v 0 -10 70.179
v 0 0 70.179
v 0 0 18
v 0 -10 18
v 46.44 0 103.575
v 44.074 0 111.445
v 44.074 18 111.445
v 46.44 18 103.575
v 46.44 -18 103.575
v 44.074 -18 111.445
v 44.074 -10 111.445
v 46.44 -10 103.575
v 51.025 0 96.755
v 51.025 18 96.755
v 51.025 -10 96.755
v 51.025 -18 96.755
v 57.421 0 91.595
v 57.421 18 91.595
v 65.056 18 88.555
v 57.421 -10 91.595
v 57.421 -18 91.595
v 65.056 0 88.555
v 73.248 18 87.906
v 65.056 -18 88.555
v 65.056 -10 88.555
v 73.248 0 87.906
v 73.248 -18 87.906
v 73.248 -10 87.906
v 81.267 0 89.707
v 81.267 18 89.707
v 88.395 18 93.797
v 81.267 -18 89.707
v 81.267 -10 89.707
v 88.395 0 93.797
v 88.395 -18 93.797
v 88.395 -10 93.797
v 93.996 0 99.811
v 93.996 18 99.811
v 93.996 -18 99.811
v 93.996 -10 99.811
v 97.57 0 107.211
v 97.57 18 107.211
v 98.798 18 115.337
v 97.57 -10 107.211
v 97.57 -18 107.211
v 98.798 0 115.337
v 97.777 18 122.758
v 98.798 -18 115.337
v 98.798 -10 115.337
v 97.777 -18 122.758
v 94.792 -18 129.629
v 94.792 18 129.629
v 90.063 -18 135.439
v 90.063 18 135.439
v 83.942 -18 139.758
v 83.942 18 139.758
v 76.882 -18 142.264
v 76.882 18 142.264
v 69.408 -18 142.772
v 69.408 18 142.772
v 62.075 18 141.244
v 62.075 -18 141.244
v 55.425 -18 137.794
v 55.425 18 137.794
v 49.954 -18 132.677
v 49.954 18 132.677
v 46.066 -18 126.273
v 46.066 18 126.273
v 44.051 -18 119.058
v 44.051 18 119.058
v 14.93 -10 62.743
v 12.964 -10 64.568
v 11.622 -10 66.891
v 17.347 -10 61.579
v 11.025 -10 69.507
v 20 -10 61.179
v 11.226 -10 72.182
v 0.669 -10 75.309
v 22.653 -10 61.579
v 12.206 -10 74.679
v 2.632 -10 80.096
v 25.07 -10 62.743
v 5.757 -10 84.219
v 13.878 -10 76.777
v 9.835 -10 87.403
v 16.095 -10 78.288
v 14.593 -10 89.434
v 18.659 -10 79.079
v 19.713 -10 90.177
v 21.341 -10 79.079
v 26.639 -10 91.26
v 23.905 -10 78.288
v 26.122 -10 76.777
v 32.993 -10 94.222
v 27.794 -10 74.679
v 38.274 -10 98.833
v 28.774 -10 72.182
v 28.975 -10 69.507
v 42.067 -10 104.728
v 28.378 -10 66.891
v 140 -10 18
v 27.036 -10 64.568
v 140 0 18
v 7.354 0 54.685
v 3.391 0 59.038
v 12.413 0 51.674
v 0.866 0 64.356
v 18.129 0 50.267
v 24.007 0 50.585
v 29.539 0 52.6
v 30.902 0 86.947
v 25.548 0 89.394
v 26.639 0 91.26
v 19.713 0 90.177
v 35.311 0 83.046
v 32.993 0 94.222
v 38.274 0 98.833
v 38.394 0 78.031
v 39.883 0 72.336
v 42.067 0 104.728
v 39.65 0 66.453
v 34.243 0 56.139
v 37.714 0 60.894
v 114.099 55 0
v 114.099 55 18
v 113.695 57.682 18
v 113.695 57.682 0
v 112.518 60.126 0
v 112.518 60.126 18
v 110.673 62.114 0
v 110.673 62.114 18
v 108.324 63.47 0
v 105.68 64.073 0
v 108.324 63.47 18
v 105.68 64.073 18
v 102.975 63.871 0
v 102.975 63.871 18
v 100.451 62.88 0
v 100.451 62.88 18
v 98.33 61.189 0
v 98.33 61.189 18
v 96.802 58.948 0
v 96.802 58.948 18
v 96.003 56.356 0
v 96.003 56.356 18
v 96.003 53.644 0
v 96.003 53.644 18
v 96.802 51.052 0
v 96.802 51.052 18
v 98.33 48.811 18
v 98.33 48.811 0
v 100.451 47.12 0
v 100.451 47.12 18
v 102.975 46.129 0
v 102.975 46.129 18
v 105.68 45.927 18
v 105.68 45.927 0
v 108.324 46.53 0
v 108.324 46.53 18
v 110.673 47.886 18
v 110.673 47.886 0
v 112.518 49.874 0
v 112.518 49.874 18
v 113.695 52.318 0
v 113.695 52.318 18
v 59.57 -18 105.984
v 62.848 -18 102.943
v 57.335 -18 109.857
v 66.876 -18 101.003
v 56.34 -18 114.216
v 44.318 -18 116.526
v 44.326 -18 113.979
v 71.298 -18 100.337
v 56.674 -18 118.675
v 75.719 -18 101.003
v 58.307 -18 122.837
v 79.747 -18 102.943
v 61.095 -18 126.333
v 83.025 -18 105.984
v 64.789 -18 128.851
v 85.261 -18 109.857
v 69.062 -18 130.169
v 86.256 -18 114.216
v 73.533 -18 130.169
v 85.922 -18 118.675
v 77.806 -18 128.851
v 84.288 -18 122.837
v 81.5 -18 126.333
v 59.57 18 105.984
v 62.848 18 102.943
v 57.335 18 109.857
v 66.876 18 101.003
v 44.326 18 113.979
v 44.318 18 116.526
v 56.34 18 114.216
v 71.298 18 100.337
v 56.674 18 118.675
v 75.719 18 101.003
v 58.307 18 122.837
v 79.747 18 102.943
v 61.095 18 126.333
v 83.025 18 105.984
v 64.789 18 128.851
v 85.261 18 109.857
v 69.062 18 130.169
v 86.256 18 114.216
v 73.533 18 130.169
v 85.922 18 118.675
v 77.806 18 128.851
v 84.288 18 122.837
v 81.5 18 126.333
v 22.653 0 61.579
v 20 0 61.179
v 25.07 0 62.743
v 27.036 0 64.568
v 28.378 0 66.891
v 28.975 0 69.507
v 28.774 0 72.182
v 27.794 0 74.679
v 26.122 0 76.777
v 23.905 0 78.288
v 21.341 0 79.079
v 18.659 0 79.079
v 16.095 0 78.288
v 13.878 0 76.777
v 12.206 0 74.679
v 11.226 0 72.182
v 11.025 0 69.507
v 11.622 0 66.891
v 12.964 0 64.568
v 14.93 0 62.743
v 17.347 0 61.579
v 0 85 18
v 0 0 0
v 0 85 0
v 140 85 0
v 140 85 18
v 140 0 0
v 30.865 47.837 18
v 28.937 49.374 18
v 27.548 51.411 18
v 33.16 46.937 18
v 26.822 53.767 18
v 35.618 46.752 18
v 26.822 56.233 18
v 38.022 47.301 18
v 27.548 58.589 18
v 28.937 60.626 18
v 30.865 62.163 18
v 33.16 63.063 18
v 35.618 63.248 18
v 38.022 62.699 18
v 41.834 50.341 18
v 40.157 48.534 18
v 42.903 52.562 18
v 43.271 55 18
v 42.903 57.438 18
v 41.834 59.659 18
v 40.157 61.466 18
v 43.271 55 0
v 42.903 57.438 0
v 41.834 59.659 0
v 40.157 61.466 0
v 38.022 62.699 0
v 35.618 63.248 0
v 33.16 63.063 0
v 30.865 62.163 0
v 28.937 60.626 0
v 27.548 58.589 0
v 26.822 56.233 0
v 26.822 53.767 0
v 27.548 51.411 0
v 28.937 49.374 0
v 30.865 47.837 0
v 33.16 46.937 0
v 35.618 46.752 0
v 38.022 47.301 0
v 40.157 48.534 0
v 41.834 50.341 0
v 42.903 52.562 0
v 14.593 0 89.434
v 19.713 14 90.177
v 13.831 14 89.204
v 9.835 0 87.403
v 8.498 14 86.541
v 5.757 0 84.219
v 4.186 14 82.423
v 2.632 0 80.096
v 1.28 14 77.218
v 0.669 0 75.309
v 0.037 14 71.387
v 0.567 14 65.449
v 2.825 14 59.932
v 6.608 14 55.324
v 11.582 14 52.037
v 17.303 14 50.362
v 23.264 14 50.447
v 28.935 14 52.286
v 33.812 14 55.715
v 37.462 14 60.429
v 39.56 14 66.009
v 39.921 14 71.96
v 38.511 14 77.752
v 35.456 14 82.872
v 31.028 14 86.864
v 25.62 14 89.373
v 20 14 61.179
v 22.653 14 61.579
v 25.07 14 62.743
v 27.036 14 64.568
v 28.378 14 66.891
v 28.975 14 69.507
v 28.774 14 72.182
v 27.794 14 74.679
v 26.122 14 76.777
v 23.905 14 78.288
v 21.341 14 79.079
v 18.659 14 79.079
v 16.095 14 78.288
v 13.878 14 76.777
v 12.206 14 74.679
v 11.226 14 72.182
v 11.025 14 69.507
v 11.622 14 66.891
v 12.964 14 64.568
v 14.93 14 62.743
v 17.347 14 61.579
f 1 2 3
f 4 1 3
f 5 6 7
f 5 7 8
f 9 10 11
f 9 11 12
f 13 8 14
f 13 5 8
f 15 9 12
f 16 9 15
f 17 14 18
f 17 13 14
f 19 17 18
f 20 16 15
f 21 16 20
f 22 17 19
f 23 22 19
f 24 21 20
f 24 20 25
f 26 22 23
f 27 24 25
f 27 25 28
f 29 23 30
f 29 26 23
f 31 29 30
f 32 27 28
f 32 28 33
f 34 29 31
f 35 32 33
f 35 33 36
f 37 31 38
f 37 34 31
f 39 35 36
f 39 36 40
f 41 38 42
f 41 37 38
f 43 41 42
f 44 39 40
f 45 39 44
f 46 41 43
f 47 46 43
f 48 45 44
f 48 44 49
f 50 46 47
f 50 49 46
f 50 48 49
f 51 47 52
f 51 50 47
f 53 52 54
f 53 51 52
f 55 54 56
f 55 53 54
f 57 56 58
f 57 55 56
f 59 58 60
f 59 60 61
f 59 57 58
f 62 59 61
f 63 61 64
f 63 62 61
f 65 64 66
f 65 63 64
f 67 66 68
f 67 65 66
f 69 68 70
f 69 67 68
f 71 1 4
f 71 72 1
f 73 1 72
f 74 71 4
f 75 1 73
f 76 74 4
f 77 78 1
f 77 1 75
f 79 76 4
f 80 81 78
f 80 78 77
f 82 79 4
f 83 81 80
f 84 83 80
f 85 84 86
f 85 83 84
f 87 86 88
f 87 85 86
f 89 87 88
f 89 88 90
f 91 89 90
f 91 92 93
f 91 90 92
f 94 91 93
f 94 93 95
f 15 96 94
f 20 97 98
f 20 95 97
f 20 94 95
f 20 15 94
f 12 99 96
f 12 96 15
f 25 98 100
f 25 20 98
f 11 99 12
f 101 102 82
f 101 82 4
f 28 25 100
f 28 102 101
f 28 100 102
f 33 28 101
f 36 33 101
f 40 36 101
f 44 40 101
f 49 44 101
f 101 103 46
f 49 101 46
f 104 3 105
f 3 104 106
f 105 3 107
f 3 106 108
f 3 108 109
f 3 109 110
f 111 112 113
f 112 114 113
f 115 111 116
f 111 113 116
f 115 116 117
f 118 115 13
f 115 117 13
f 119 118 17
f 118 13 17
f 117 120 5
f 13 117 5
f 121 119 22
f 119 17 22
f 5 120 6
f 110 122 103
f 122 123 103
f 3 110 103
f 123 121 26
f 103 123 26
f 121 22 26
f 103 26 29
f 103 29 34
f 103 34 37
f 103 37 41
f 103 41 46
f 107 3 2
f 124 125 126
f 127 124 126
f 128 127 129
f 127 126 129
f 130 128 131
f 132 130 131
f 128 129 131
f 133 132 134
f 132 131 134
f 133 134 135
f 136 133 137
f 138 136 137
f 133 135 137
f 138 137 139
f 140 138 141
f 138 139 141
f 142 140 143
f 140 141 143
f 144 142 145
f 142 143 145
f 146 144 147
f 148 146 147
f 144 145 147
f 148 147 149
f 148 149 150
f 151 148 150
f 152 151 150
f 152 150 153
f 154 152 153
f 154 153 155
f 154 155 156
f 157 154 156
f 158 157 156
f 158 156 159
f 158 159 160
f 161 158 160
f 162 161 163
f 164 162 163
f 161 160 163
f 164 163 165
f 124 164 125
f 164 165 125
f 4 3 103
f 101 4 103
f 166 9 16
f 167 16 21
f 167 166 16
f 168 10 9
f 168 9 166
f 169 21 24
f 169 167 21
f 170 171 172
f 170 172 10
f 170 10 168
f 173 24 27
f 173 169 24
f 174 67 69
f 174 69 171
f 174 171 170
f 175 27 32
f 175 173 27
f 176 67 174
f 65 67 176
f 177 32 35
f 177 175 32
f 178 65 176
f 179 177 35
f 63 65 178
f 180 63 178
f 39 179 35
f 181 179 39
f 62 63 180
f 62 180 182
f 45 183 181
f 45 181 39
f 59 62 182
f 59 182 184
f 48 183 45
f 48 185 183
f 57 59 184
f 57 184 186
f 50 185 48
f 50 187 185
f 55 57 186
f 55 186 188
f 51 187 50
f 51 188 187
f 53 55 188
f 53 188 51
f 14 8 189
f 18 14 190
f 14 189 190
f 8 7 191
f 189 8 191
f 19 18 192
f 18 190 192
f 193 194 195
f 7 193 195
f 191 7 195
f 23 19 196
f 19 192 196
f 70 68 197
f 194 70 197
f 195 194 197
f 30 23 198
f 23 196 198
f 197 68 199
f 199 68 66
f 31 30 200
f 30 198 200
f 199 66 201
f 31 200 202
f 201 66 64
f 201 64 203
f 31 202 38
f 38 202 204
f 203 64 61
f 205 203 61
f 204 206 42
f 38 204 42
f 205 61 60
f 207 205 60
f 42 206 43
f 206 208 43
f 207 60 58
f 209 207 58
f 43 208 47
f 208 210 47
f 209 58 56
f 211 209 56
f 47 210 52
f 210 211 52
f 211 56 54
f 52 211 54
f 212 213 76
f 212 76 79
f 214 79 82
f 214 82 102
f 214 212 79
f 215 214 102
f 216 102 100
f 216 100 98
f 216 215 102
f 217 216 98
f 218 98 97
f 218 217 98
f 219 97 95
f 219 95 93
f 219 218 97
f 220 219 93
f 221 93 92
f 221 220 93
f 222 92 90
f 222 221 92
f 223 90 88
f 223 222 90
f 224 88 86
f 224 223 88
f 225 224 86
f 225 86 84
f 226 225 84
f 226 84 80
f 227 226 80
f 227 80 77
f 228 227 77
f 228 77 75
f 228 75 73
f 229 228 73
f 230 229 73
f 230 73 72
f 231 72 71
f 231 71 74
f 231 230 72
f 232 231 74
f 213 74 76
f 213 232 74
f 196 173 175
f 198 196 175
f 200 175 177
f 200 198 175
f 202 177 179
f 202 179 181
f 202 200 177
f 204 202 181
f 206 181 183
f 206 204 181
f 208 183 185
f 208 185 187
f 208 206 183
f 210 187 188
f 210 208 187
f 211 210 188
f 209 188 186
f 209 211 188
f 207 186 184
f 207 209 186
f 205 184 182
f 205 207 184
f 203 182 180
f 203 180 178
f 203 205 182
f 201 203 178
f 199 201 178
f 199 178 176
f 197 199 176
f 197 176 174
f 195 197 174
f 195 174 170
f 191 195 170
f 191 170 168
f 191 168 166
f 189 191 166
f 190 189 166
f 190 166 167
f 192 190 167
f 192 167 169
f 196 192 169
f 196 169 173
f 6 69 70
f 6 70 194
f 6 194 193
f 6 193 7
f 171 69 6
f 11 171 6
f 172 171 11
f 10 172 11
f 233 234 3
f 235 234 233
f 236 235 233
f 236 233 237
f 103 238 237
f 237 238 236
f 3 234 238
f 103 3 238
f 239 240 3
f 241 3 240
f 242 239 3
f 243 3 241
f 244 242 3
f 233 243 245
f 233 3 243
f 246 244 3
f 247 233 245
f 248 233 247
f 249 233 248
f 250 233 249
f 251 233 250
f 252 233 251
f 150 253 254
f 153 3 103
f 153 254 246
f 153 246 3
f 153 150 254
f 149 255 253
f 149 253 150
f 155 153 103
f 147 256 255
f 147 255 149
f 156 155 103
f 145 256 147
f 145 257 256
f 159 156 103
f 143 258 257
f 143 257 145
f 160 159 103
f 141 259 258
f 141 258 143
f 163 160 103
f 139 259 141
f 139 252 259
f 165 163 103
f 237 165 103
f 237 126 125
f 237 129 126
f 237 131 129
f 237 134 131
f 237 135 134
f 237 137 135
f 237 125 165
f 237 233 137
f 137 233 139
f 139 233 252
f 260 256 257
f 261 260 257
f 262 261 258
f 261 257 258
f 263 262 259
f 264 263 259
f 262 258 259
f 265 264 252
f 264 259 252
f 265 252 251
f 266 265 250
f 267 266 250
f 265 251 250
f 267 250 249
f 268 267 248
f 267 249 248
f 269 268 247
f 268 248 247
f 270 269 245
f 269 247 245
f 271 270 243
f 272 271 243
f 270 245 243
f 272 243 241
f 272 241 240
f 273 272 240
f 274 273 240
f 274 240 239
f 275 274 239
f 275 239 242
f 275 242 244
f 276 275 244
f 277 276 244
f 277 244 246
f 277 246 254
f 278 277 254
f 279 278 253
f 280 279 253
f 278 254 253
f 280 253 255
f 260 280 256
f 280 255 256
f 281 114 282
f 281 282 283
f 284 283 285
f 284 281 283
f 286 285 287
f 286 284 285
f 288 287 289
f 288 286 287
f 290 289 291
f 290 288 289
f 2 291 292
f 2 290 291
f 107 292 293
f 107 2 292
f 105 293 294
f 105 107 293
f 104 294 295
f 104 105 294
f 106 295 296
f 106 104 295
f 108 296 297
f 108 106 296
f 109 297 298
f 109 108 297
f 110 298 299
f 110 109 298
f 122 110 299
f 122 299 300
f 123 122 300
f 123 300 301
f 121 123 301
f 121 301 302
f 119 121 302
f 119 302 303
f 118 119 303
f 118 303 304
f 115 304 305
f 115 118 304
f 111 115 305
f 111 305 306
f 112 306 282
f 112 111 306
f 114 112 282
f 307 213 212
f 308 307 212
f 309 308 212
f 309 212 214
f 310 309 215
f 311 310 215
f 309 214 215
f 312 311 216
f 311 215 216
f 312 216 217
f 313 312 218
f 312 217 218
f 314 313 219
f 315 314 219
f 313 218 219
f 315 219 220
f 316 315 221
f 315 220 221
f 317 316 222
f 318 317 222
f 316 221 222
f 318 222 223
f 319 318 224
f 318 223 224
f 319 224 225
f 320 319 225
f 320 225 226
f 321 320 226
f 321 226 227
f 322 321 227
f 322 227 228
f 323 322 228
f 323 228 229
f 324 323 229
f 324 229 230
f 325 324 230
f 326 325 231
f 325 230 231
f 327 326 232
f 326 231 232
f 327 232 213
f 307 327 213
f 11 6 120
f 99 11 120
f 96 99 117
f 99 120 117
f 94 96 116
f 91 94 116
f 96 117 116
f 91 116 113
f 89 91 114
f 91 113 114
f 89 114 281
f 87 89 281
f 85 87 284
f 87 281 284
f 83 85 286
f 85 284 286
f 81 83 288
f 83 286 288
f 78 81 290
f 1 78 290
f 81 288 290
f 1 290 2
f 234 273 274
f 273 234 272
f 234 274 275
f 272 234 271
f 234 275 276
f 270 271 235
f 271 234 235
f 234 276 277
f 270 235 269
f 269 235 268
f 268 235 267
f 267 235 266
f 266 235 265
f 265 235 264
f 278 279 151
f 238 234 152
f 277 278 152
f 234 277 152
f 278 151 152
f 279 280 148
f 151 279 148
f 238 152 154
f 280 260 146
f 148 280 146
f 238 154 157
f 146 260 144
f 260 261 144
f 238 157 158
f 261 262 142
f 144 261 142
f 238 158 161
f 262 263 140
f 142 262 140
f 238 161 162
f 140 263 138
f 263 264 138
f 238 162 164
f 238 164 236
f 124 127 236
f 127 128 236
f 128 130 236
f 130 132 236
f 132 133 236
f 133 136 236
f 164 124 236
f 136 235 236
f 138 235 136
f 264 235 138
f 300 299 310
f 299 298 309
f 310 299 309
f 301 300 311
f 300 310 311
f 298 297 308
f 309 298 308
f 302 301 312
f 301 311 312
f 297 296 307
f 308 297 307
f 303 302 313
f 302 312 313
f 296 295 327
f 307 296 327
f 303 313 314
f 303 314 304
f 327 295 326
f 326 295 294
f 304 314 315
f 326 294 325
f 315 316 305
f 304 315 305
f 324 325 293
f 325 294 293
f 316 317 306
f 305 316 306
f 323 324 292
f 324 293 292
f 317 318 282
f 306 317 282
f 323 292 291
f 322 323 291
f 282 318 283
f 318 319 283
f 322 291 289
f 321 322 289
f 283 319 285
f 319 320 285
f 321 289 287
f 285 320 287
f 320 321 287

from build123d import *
from build123d.topology import SkipClean

# Parameters (mm, degrees)
SKETCH1_W           = 140
SKETCH1_H           = 85
BOSS_EXTRUDE1_DEPTH = 18
SKETCH6_R           = 15
SKETCH6_R_2         = 9
BOSS_EXTRUDE6_DEPTH = 10
SKETCH6_4_R         = 15
BOSS_EXTRUDE7_DEPTH = 18
SKETCH6_5_R         = 9
BOSS_EXTRUDE8_DEPTH = 14
SKETCH13_R          = 8.270703546
SKETCH13_R_2        = 9.098859586
CUT_EXTRUDE1_DEPTH  = 18


with BuildPart() as part:
    # Sketch1 → Boss-Extrude1 (new body)
    with BuildSketch(Plane.XY):
        with Locations((70, 42.5)):
            Rectangle(SKETCH1_W, SKETCH1_H)
    extrude(amount=BOSS_EXTRUDE1_DEPTH)

    # Sketch13 → Cut-Extrude1 (cut)
    with BuildSketch(Plane.XY.offset(18)):
        with Locations((35, 55)):
            Circle(SKETCH13_R)
        with Locations((105, 55)):
            Circle(SKETCH13_R_2)
    extrude(amount=-CUT_EXTRUDE1_DEPTH, mode=Mode.SUBTRACT)


with BuildPart() as body_2:
    # Sketch6 → Boss-Extrude6 (new body)
    with BuildSketch(Plane.XZ):
        with BuildLine():
            ThreePointArc((44.050656558, 119.058334348), (38.471531135, 99.064679581), (19.712968781, 90.177092179))
            ThreePointArc((19.712968781, 90.177092179), (5.756745028, 84.219439982), (0, 70.179151958))
            Line((0, 70.179151958), (0, 18))
            Line((0, 18), (140, 18))
            Line((140, 18), (98.797681926, 115.336828121))
            ThreePointArc((98.797681926, 115.336828121), (73.162729161, 142.773511573), (44.050656558, 119.058334348))
        make_face()
        with Locations((71.297681926, 115.336828121)):
            Circle(SKETCH6_R, mode=Mode.SUBTRACT)
        with Locations((20, 70.179151958)):
            Circle(SKETCH6_R_2, mode=Mode.SUBTRACT)
    extrude(amount=BOSS_EXTRUDE6_DEPTH)

    # Sketch6<4> → Boss-Extrude7 (add, symmetric)
    with SkipClean():  # the faces are left unmerged after this step: merging them gives an invalid solid
        with BuildSketch(Plane.XZ):
            with BuildLine():
                ThreePointArc((44.074445993, 111.445115727), (73.248452524, 87.906106401), (98.797681926, 115.336828121))
                ThreePointArc((98.797681926, 115.336828121), (73.162729161, 142.773511573), (44.050656558, 119.058334348))
                ThreePointArc((44.050656558, 119.058334348), (44.354057707, 115.252635924), (44.074445993, 111.445115727))
            make_face()
            with Locations((71.297681926, 115.336828121)):
                Circle(SKETCH6_4_R, mode=Mode.SUBTRACT)
        extrude(amount=BOSS_EXTRUDE7_DEPTH, both=True)

    # Sketch6<5> → Boss-Extrude8 (add)
    with SkipClean():  # the faces are left unmerged after this step: merging them gives an invalid solid
        with BuildSketch(Plane.XZ):
            with BuildLine():
                ThreePointArc((40, 70.179151958), (34.040288025, 84.422406929), (19.712968781, 90.177092179))
                ThreePointArc((19.712968781, 90.177092179), (5.756745028, 84.219439982), (0, 70.179151958))
                ThreePointArc((0, 70.179151958), (20, 50.179151958), (40, 70.179151958))
            make_face()
            with Locations((20, 70.179151958)):
                Circle(SKETCH6_5_R, mode=Mode.SUBTRACT)
        extrude(amount=-BOSS_EXTRUDE8_DEPTH)


solid = Compound([part.part, body_2.part])
